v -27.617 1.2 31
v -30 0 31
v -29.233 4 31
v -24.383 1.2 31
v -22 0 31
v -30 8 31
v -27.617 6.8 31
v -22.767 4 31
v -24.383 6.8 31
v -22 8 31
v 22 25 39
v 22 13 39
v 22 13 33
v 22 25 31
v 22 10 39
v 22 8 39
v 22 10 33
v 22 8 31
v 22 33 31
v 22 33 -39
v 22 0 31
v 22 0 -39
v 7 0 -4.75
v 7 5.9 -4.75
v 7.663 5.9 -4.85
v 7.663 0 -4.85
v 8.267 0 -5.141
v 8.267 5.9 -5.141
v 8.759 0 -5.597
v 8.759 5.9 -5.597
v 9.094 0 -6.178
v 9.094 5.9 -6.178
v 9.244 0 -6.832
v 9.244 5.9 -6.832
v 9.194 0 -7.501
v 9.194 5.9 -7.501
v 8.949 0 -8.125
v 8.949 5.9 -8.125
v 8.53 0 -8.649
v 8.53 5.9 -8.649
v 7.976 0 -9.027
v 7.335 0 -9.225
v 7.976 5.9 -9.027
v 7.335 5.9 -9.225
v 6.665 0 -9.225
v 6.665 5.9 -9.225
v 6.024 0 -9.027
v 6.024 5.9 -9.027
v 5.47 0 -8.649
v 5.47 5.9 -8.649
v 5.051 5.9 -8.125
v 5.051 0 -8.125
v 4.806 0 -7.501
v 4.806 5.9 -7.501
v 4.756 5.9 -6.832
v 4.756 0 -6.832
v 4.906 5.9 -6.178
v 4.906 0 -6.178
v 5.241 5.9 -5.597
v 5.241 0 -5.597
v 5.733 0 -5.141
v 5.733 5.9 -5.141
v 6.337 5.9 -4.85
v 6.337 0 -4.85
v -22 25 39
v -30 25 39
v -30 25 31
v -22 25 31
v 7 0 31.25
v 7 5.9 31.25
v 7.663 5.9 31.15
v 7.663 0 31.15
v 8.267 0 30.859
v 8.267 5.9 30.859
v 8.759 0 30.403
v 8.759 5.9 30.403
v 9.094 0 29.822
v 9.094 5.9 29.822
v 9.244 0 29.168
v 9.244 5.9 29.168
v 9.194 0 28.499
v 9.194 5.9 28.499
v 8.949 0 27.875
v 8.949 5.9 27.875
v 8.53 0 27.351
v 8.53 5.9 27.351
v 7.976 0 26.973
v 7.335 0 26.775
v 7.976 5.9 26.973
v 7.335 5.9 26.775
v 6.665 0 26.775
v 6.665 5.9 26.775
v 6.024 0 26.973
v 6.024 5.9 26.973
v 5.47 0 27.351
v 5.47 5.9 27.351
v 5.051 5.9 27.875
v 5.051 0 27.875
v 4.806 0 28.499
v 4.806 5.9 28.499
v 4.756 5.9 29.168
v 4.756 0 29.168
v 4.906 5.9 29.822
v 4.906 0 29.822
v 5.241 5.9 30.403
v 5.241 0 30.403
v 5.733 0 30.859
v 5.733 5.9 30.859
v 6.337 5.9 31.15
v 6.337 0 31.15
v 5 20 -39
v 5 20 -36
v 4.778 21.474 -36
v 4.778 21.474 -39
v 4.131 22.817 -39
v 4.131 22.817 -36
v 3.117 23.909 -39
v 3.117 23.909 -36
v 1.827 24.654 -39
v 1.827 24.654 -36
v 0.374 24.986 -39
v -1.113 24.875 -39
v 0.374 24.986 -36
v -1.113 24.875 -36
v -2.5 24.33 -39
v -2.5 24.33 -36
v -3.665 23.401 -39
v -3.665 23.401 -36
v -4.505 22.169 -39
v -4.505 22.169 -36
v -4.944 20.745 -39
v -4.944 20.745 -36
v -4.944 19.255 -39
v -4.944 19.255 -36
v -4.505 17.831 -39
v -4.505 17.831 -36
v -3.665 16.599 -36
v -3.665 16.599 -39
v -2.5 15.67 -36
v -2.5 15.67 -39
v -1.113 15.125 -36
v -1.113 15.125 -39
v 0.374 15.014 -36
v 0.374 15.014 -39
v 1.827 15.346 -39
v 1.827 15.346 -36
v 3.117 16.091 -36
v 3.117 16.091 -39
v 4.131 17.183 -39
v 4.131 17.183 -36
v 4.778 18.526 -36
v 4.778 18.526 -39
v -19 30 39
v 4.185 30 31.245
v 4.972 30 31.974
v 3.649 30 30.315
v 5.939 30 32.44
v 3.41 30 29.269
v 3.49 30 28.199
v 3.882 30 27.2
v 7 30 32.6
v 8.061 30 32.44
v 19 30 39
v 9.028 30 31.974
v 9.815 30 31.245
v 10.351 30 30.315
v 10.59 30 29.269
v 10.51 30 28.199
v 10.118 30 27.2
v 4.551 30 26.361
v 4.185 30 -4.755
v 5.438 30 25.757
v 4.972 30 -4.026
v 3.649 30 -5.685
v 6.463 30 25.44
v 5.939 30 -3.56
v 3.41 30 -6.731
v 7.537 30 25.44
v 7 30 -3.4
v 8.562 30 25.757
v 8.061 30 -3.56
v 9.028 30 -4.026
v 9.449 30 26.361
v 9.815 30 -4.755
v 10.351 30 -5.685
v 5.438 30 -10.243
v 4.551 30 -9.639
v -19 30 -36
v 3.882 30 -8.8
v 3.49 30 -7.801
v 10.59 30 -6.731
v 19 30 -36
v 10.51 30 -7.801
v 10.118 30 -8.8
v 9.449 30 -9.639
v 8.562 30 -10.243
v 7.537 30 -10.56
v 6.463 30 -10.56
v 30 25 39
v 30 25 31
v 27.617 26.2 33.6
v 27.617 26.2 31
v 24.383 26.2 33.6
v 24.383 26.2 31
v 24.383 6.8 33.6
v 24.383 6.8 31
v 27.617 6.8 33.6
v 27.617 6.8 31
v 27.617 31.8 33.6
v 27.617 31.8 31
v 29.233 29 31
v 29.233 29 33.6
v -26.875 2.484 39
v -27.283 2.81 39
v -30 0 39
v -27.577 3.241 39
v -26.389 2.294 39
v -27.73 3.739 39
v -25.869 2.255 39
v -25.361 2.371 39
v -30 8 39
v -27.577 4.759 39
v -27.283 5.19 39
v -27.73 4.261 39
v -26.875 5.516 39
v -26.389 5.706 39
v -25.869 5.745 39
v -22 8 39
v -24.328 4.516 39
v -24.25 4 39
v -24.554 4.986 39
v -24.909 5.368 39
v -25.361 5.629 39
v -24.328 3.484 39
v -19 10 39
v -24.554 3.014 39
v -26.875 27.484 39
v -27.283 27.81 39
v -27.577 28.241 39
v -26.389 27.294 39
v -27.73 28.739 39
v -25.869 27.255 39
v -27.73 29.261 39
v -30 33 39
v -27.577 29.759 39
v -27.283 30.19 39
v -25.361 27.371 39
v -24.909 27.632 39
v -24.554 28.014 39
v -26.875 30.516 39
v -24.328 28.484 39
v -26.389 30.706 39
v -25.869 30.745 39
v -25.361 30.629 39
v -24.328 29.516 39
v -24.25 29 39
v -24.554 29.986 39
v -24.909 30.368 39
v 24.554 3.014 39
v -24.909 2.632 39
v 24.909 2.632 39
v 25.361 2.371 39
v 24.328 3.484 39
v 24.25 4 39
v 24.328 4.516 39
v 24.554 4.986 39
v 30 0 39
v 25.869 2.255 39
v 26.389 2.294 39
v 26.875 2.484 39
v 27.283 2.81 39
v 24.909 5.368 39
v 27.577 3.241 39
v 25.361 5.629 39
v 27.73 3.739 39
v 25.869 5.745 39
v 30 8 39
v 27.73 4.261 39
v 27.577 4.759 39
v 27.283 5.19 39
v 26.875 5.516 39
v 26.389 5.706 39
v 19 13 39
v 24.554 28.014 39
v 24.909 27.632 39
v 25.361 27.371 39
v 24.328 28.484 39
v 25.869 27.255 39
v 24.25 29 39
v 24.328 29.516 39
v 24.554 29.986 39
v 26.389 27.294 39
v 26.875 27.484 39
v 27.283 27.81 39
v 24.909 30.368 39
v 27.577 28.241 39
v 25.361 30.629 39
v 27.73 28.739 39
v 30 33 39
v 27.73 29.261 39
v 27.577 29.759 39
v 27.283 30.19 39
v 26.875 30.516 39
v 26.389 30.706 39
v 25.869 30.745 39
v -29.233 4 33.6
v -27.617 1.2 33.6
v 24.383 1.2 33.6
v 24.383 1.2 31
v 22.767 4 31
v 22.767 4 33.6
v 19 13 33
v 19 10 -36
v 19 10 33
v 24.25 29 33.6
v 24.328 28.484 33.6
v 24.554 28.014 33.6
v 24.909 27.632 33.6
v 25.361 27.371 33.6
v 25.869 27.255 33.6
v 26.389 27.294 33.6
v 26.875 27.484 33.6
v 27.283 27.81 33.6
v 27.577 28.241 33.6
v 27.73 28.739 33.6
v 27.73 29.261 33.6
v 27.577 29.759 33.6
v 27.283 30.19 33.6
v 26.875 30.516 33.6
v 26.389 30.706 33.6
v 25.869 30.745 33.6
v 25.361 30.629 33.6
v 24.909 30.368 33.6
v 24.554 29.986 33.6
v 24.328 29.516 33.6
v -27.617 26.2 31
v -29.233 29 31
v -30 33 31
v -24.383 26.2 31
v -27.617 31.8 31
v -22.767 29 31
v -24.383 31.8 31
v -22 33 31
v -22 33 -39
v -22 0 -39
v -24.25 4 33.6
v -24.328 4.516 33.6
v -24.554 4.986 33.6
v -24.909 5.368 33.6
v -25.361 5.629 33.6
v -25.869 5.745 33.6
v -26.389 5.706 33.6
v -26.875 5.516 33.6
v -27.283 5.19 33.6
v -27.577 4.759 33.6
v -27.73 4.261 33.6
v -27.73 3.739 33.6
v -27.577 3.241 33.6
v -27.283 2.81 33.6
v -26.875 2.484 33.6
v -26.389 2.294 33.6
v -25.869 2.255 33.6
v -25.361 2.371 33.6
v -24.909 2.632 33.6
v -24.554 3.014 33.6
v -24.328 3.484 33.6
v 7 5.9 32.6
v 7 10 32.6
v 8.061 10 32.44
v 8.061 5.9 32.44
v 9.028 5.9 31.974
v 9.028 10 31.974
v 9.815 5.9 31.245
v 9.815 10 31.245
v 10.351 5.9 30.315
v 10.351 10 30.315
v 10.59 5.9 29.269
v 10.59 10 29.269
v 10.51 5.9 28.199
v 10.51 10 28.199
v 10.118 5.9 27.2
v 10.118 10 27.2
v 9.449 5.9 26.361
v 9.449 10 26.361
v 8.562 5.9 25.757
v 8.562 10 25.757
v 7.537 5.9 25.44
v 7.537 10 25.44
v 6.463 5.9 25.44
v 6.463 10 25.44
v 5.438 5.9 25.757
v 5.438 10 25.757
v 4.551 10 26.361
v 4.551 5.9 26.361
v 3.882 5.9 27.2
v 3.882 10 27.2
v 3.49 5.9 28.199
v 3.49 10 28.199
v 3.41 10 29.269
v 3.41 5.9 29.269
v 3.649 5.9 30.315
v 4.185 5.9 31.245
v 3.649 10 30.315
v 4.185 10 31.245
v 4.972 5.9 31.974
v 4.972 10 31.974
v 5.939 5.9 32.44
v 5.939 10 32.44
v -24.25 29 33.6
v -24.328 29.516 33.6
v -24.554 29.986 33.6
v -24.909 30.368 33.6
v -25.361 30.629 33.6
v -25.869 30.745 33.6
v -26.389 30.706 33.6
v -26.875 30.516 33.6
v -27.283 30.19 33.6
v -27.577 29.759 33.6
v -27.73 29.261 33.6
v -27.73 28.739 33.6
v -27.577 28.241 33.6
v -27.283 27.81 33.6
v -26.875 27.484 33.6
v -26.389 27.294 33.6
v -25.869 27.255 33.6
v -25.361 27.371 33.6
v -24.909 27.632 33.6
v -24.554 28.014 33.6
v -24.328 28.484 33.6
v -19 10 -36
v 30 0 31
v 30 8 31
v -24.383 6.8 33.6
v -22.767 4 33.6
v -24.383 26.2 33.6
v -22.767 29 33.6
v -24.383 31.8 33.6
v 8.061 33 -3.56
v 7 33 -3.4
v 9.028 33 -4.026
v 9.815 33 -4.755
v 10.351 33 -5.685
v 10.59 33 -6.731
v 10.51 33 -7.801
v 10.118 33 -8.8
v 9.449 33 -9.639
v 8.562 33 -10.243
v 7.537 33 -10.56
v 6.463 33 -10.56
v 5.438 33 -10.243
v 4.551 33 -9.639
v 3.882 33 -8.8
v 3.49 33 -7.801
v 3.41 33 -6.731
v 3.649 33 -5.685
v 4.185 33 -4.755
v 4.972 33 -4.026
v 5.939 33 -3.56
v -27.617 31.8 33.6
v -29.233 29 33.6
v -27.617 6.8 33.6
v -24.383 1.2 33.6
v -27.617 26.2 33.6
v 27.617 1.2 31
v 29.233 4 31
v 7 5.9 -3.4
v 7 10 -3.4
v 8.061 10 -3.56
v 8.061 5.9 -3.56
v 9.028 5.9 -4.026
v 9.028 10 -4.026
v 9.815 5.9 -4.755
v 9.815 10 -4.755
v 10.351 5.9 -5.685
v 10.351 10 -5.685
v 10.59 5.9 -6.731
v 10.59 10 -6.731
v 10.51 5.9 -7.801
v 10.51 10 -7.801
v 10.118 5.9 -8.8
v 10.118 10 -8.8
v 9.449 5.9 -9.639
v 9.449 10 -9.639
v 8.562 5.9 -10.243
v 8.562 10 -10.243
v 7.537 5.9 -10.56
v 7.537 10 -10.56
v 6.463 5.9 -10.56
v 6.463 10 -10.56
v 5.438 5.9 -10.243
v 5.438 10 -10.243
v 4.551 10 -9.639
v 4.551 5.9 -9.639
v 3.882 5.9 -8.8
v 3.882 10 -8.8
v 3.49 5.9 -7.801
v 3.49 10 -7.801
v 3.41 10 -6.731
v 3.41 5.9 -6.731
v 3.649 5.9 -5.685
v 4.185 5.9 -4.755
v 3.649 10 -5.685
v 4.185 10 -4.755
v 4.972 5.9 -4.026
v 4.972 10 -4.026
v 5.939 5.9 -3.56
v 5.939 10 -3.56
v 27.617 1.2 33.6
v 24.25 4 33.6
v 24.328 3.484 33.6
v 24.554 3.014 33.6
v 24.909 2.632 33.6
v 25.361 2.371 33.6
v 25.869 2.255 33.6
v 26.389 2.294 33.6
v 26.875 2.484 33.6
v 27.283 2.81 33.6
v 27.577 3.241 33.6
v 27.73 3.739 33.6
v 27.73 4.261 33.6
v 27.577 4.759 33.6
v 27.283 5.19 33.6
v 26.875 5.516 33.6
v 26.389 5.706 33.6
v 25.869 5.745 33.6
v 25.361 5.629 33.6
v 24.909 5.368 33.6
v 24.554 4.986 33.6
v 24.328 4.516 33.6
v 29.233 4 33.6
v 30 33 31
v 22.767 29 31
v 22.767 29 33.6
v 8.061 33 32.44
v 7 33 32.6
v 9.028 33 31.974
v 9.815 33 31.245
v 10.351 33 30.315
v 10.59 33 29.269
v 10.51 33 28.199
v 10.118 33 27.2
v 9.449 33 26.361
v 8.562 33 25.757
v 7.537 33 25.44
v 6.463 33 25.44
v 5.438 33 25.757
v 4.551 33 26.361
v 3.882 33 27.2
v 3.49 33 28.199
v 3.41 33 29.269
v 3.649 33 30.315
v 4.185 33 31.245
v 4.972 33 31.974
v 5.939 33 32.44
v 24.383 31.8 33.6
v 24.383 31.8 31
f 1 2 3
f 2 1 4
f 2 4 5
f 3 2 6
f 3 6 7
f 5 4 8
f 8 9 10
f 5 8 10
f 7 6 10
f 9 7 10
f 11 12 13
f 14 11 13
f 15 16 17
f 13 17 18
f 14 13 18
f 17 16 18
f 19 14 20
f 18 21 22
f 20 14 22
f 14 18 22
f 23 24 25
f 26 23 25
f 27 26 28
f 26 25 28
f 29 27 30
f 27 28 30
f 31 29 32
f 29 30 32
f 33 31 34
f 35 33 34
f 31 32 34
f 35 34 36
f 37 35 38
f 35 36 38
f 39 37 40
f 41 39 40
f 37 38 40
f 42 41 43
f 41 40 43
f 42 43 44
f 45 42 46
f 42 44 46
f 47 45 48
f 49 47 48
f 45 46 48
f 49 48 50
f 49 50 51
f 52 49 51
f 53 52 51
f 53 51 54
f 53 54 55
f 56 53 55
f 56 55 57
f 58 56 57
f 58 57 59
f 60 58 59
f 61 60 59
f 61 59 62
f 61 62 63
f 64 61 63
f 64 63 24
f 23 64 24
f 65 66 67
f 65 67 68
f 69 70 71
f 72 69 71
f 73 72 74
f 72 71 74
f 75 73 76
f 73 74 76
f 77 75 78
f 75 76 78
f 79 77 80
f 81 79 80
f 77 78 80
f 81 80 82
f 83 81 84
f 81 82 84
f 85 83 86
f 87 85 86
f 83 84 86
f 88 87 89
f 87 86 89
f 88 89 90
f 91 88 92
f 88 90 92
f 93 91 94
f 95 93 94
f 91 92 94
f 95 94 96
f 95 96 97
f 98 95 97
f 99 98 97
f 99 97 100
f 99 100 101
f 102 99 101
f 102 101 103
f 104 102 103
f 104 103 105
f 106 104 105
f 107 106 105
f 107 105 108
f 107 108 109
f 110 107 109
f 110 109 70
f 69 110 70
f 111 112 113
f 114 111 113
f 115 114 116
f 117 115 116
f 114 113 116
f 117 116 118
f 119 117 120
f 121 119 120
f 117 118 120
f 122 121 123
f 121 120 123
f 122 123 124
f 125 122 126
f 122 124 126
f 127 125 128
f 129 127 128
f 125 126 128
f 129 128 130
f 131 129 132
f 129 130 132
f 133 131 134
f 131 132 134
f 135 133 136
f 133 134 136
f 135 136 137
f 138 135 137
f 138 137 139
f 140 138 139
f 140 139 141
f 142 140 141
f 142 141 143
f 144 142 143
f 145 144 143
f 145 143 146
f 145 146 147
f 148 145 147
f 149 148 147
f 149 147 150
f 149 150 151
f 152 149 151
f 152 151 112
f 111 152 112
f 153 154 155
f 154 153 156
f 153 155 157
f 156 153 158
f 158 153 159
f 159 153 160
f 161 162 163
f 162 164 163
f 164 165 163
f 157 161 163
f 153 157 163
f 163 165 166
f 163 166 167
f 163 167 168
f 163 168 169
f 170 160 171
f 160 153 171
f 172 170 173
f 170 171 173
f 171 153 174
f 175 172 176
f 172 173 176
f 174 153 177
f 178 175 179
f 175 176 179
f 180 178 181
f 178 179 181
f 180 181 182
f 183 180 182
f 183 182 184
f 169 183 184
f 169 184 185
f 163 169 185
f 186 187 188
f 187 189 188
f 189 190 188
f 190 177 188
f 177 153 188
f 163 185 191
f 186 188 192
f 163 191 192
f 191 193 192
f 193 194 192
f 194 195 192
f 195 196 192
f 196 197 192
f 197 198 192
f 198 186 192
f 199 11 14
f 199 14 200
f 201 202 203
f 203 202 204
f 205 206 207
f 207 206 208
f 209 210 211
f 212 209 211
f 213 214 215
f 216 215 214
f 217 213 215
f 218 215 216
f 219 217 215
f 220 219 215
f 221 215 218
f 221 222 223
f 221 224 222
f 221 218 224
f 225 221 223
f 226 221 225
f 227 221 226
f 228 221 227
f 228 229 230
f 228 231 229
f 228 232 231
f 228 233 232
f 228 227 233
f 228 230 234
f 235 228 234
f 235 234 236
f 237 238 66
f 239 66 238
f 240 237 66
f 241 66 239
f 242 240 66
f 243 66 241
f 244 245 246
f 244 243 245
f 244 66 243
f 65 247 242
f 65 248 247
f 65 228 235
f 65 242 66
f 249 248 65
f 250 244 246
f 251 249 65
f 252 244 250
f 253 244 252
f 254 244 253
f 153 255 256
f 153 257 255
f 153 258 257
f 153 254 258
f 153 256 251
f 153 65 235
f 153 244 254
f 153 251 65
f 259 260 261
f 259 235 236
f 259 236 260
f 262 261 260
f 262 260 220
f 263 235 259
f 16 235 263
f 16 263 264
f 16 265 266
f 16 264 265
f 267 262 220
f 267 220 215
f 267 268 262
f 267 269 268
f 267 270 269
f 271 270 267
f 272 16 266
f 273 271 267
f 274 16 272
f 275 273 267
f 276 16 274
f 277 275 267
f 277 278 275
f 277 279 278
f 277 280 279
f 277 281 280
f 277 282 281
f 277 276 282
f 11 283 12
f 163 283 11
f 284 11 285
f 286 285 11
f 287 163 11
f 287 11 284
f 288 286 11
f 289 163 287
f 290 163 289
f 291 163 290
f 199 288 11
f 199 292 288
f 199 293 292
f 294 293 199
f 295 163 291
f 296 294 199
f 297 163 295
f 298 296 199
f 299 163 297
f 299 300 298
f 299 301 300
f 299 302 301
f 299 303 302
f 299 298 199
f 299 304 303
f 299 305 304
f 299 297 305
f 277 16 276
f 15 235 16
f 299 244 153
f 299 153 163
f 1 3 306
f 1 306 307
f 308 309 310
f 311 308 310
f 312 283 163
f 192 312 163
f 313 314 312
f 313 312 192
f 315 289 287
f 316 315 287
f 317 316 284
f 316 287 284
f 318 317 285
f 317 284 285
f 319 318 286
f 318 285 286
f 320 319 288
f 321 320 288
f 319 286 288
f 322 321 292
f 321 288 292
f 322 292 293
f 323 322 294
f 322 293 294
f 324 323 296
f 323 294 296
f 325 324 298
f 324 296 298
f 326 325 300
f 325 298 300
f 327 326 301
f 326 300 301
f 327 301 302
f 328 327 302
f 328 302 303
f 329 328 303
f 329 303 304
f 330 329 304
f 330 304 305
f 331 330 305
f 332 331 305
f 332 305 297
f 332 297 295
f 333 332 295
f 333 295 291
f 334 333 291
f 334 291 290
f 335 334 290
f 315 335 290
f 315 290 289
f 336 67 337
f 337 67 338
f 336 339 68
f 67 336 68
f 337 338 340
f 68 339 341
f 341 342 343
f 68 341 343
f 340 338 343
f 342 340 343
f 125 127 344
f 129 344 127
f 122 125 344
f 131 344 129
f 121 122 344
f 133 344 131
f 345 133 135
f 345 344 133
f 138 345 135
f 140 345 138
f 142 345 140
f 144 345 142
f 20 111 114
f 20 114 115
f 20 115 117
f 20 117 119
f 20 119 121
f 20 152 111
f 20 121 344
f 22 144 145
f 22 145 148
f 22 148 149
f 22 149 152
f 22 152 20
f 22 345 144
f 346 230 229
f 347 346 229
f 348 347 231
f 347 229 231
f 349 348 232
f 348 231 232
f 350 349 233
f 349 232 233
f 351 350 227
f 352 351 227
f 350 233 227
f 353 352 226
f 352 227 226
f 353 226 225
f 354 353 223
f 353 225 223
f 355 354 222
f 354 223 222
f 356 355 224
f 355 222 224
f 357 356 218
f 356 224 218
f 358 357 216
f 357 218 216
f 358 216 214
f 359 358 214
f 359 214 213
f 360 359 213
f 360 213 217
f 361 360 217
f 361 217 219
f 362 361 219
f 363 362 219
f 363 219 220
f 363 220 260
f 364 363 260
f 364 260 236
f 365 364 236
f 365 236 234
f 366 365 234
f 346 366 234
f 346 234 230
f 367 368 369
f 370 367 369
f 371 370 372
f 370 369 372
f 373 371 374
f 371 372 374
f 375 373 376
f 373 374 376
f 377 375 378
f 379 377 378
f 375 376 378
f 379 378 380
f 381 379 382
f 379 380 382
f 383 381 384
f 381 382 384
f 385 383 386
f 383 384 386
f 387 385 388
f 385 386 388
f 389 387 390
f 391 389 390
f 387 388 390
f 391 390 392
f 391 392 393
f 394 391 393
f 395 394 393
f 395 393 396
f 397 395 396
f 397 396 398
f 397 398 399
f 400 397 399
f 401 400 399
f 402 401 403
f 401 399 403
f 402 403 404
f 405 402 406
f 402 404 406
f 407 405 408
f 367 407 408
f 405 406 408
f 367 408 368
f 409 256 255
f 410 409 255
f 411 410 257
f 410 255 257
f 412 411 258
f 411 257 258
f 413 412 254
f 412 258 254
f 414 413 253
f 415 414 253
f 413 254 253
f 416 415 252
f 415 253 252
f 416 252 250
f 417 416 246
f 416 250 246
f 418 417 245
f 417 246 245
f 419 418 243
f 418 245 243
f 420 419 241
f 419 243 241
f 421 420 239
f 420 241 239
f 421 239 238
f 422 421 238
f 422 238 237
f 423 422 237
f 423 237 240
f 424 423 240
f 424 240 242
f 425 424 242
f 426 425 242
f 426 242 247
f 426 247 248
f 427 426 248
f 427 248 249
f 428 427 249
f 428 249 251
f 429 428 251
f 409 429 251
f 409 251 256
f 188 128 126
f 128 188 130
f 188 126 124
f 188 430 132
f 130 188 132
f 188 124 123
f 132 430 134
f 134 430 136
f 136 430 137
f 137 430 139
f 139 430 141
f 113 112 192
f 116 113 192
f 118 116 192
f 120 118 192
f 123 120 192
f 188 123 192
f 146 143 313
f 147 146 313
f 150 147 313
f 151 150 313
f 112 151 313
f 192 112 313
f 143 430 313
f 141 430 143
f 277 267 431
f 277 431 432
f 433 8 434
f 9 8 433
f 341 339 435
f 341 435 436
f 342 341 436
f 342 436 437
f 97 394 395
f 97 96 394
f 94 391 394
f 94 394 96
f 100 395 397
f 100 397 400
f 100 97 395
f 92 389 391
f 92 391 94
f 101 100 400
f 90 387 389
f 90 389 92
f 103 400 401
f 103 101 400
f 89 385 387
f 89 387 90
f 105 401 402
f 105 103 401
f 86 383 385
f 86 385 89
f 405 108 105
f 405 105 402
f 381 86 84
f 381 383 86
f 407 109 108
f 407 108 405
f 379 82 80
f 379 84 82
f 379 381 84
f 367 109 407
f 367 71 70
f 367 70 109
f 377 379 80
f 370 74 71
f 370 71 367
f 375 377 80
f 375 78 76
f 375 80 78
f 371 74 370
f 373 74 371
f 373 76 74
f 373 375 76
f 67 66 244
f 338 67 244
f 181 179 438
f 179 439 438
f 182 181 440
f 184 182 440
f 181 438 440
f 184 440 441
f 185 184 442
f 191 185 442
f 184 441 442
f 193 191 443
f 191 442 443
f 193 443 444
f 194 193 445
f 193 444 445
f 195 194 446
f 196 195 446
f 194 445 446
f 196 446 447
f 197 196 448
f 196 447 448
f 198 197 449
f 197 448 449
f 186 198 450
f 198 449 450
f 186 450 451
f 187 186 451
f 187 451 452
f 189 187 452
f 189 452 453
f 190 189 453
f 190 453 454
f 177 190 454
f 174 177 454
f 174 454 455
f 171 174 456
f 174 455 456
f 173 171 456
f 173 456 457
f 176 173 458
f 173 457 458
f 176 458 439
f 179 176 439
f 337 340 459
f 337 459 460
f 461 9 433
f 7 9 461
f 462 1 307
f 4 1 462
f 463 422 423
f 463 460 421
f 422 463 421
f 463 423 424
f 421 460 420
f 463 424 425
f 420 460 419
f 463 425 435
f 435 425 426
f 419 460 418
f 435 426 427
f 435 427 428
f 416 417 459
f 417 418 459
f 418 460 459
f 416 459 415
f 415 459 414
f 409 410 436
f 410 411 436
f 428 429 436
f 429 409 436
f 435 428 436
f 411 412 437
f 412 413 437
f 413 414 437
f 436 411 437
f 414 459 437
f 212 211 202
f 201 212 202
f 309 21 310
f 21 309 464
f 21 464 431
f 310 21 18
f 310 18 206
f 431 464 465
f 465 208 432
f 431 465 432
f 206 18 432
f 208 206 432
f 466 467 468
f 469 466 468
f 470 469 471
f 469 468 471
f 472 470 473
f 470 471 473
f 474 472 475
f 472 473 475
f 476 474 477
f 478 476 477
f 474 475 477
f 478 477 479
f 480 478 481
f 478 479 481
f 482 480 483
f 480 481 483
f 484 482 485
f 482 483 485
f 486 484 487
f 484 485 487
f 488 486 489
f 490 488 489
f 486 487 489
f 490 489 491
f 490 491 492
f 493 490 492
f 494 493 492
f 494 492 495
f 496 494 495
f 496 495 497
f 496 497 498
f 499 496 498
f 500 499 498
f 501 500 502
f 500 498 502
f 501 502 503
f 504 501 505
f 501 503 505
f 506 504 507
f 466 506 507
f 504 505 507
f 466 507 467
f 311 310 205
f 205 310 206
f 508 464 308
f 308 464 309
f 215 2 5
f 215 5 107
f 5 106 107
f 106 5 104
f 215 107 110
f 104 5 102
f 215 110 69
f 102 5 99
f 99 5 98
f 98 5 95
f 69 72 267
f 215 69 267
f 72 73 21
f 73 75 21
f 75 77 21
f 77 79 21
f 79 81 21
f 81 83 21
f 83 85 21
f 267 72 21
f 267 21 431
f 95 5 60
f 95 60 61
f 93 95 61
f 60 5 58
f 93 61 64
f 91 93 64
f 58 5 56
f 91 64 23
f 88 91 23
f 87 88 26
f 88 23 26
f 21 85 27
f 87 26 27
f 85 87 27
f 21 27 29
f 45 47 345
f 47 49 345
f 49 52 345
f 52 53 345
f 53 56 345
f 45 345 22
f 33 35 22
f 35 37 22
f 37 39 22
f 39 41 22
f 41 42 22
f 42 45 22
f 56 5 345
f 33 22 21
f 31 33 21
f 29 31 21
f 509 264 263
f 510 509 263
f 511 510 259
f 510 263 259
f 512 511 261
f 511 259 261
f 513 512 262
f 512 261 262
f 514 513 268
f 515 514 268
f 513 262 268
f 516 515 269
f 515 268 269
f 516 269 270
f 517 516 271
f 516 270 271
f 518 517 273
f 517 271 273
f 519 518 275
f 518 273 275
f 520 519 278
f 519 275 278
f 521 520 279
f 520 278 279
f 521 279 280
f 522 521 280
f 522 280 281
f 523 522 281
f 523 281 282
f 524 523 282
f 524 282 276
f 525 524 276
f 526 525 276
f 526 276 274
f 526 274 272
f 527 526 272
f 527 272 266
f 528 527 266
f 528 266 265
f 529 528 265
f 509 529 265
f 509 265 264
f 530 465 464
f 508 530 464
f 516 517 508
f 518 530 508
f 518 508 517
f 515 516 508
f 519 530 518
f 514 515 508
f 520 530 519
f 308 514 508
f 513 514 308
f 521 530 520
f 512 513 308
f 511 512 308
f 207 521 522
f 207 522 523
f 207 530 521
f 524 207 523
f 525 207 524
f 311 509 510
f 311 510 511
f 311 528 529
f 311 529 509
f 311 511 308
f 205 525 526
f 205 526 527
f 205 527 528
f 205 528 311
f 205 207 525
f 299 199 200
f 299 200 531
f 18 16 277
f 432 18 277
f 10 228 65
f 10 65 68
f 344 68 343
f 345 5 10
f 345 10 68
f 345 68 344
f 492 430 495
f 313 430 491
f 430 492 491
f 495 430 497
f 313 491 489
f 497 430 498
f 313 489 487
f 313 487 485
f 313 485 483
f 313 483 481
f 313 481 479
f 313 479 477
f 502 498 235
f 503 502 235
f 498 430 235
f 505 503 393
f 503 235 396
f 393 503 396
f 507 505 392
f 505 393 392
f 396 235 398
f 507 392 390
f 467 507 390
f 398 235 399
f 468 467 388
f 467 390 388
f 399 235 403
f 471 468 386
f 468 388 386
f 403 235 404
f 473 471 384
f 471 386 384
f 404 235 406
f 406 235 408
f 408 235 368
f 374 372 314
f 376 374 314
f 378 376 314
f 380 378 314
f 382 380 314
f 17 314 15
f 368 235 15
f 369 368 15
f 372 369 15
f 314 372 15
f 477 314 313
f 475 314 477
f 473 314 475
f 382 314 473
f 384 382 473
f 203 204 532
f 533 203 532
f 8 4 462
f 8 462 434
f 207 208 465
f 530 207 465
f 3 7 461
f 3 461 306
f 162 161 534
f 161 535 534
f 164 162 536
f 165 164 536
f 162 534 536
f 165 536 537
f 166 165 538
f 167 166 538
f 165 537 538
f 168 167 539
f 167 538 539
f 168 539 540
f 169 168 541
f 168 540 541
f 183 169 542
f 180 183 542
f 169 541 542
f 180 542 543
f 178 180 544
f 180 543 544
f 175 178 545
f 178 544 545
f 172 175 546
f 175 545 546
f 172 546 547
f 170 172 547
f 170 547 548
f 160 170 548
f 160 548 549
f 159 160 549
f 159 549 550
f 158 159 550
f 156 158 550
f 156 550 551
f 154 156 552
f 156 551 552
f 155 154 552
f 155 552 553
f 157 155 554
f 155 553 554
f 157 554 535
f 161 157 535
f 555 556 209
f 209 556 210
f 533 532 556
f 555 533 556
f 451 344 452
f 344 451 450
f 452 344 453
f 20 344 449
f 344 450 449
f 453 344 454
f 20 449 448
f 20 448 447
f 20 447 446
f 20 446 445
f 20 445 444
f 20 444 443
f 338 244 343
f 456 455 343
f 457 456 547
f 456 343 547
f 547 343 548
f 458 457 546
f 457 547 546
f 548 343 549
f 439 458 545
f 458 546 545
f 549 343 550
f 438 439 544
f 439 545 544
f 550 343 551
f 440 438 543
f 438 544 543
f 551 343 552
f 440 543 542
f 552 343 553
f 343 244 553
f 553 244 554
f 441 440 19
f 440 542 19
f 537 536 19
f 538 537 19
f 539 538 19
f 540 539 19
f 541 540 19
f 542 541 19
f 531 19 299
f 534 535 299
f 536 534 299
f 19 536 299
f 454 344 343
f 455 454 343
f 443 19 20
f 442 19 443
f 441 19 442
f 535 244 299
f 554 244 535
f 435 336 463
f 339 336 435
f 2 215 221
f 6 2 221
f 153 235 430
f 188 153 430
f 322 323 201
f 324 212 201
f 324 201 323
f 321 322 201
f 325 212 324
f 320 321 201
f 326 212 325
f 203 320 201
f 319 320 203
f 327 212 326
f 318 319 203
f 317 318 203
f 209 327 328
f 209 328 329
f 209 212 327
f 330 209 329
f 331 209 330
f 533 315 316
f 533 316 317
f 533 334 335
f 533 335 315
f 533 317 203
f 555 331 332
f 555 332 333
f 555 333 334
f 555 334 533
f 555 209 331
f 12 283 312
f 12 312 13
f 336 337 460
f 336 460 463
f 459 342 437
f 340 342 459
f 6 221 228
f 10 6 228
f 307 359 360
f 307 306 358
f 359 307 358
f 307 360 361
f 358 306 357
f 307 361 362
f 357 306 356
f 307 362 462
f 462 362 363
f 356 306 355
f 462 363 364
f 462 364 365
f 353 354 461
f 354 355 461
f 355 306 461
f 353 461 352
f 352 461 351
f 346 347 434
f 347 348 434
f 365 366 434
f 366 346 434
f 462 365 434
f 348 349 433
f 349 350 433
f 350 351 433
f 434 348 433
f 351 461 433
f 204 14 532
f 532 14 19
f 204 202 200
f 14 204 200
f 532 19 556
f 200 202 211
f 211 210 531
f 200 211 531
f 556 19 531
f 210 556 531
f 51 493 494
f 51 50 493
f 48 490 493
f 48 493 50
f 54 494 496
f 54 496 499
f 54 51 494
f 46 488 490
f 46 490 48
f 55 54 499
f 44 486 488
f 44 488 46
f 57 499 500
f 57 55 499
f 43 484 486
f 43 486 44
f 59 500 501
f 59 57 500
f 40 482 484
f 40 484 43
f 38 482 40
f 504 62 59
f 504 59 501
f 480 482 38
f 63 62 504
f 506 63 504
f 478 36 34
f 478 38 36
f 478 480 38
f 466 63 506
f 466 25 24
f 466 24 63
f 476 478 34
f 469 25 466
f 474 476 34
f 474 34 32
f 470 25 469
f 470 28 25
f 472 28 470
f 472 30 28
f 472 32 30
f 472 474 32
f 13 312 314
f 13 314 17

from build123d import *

# Parameters (mm, degrees)
SKETCH_1_W                 = 44
SKETCH_1_H                 = 78
EXTRUDE_1_DEPTH            = 33
SHELL_1_T                  = -3
SHELL_1_THICKNESS_2_FACE_W = 75
SHELL_1_THICKNESS_2_FACE_H = 38
SHELL_1_THICKNESS_2_DEPTH  = 7
SKETCH_3_R                 = 3.6
CUT_EXTRUDE_1_DEPTH        = 4.1
CUT_EXTRUDE_2_REACH        = 52.339
SKETCH_4_R                 = 2.25
SKETCH_5_W                 = 3
SKETCH_5_H                 = 3
CUT_EXTRUDE_3_DEPTH        = 6
SKETCH_6_W                 = 8
SKETCH_6_H                 = 8
SKETCH_6_R                 = 1.75
EXTRUDE_2_DEPTH            = 8
CUT_EXTRUDE_4_DEPTH        = 2.6
CUT_EXTRUDE_5_REACH        = 89.258
SKETCH_8_R                 = 5
CUT_EXTRUDE_6_REACH        = 61.245
SKETCH_9_R                 = 3.6


with BuildPart() as part:
    # 草圖1 → 填料-伸長1 (new body)
    with BuildSketch(Plane(origin=(0, 0, 0), x_dir=(1, 0, 0), z_dir=(0, 1, 0))):
        Rectangle(SKETCH_1_W, SKETCH_1_H)
    extrude(amount=EXTRUDE_1_DEPTH)

    # 薄殼1
    shell_1_openings = [part.faces().sort_by_distance(p)[0] for p in [
        (0, 16.5, 39),
    ]]
    offset(amount=SHELL_1_T, openings=shell_1_openings, kind=Kind.INTERSECTION)

    # 薄殼1 thickness 2 face (on inner face of the shell) → 薄殼1 thickness 2 (add)
    with BuildSketch(Plane(origin=(0, 3, 1.5), x_dir=(0, 0, -1), z_dir=(0, -1, 0))):
        Rectangle(SHELL_1_THICKNESS_2_FACE_W, SHELL_1_THICKNESS_2_FACE_H)
    extrude(amount=-SHELL_1_THICKNESS_2_DEPTH)

    # 草圖3 → 除料-伸長1 (cut)
    with BuildSketch(Plane(origin=(0, 10, 0), x_dir=(1, 0, 0), z_dir=(0, 1, 0))):
        with Locations(Location((7, 7, 0), (0, 0, 270))):
            Circle(SKETCH_3_R)
        with Locations(Location((7, -29, 0), (0, 0, 270))):
            Circle(SKETCH_3_R)
    extrude(amount=-CUT_EXTRUDE_1_DEPTH, mode=Mode.SUBTRACT)

    # 草圖4 → 除料-伸長2 (cut, up to next)
    with BuildSketch(Plane(origin=(0, 10, 0), x_dir=(1, 0, 0), z_dir=(0, 1, 0)), mode=Mode.PRIVATE) as cut_extrude_2_sk1:
        with Locations(Location((7, 7, 0), (0, 0, 270))):
            Circle(SKETCH_4_R)
    cut_extrude_2_tool1 = extrude(cut_extrude_2_sk1.sketch, amount=-CUT_EXTRUDE_2_REACH, mode=Mode.PRIVATE) & part.part
    # 草圖4 → 除料-伸長2 (cut, up to next)
    with BuildSketch(Plane(origin=(0, 10, 0), x_dir=(1, 0, 0), z_dir=(0, 1, 0)), mode=Mode.PRIVATE) as cut_extrude_2_sk2:
        with Locations(Location((7, -29, 0), (0, 0, 270))):
            Circle(SKETCH_4_R)
    cut_extrude_2_tool2 = extrude(cut_extrude_2_sk2.sketch, amount=-CUT_EXTRUDE_2_REACH, mode=Mode.PRIVATE) & part.part
    add(cut_extrude_2_tool1.solids().sort_by_distance((7, 10, -7))[0], mode=Mode.SUBTRACT)
    add(cut_extrude_2_tool2.solids().sort_by_distance((7, 10, 29))[0], mode=Mode.SUBTRACT)

    # 草圖5 → 除料-伸長3 (cut)
    with BuildSketch(Plane.XY.offset(39)):
        with Locations((20.5, 11.5)):
            Rectangle(SKETCH_5_W, SKETCH_5_H)
    extrude(amount=-CUT_EXTRUDE_3_DEPTH, mode=Mode.SUBTRACT)

    # 草圖6 → 填料-伸長2 (add)
    with BuildSketch(Plane.XY.offset(39)):
        with Locations((-26, 29)):
            Rectangle(SKETCH_6_W, SKETCH_6_H)
        with Locations((-26, 29)):
            Circle(SKETCH_6_R, mode=Mode.SUBTRACT)
        with Locations((-26, 4)):
            Rectangle(SKETCH_6_W, SKETCH_6_H)
        with Locations((-26, 4)):
            Circle(SKETCH_6_R, mode=Mode.SUBTRACT)
        with Locations((26, 4)):
            Rectangle(SKETCH_6_W, SKETCH_6_H)
        with Locations(Location((26, 4, 0), (0, 0, 180))):
            Circle(SKETCH_6_R, mode=Mode.SUBTRACT)
        with Locations((26, 29)):
            Rectangle(SKETCH_6_W, SKETCH_6_H)
        with Locations(Location((26, 29, 0), (0, 0, 180))):
            Circle(SKETCH_6_R, mode=Mode.SUBTRACT)
    extrude(amount=-EXTRUDE_2_DEPTH)

    # 草圖7 → 除料-伸長4 (cut)
    with BuildSketch(Plane(origin=(0, 0, 31), x_dir=(-1, 0, 0), z_dir=(0, 0, -1))):
        Polygon((27.616580754, 6.8), (29.233161507, 4), (27.616580754, 1.2), (24.383419246, 1.2), (22.766838493, 4), (24.383419246, 6.8), align=None)
        Polygon((-22.766838493, 29), (-24.383419246, 31.8), (-27.616580754, 31.8), (-29.233161507, 29), (-27.616580754, 26.2), (-24.383419246, 26.2), align=None)
        Polygon((-29.233161507, 4), (-27.616580754, 1.2), (-24.383419246, 1.2), (-22.766838493, 4), (-24.383419246, 6.8), (-27.616580754, 6.8), align=None)
        Polygon((24.383419246, 26.2), (22.766838493, 29), (24.383419246, 31.8), (27.616580754, 31.8), (29.233161507, 29), (27.616580754, 26.2), align=None)
    extrude(amount=-CUT_EXTRUDE_4_DEPTH, mode=Mode.SUBTRACT)

    # 草圖8 → 除料-伸長5 (cut, up to next)
    with BuildSketch(Plane.XY.offset(-36), mode=Mode.PRIVATE) as cut_extrude_5_sk1:
        with Locations((0, 20)):
            Circle(SKETCH_8_R)
    cut_extrude_5_tool1 = extrude(cut_extrude_5_sk1.sketch, amount=-CUT_EXTRUDE_5_REACH, mode=Mode.PRIVATE) & part.part
    add(cut_extrude_5_tool1.solids().sort_by_distance((0, 20, -36))[0], mode=Mode.SUBTRACT)

    # 草圖9 → 除料-伸長6 (cut, up to next)
    with BuildSketch(Plane(origin=(0, 33, 0), x_dir=(1, 0, 0), z_dir=(0, 1, 0)), mode=Mode.PRIVATE) as cut_extrude_6_sk1:
        with Locations(Location((7, 7, 0), (0, 0, 270))):
            Circle(SKETCH_9_R)
    cut_extrude_6_tool1 = extrude(cut_extrude_6_sk1.sketch, amount=-CUT_EXTRUDE_6_REACH, mode=Mode.PRIVATE) & part.part
    # 草圖9 → 除料-伸長6 (cut, up to next)
    with BuildSketch(Plane(origin=(0, 33, 0), x_dir=(1, 0, 0), z_dir=(0, 1, 0)), mode=Mode.PRIVATE) as cut_extrude_6_sk2:
        with Locations(Location((7, -29, 0), (0, 0, 270))):
            Circle(SKETCH_9_R)
    cut_extrude_6_tool2 = extrude(cut_extrude_6_sk2.sketch, amount=-CUT_EXTRUDE_6_REACH, mode=Mode.PRIVATE) & part.part
    add(cut_extrude_6_tool1.solids().sort_by_distance((7, 33, -7))[0], mode=Mode.SUBTRACT)
    add(cut_extrude_6_tool2.solids().sort_by_distance((7, 33, 29))[0], mode=Mode.SUBTRACT)


solid = part.part
